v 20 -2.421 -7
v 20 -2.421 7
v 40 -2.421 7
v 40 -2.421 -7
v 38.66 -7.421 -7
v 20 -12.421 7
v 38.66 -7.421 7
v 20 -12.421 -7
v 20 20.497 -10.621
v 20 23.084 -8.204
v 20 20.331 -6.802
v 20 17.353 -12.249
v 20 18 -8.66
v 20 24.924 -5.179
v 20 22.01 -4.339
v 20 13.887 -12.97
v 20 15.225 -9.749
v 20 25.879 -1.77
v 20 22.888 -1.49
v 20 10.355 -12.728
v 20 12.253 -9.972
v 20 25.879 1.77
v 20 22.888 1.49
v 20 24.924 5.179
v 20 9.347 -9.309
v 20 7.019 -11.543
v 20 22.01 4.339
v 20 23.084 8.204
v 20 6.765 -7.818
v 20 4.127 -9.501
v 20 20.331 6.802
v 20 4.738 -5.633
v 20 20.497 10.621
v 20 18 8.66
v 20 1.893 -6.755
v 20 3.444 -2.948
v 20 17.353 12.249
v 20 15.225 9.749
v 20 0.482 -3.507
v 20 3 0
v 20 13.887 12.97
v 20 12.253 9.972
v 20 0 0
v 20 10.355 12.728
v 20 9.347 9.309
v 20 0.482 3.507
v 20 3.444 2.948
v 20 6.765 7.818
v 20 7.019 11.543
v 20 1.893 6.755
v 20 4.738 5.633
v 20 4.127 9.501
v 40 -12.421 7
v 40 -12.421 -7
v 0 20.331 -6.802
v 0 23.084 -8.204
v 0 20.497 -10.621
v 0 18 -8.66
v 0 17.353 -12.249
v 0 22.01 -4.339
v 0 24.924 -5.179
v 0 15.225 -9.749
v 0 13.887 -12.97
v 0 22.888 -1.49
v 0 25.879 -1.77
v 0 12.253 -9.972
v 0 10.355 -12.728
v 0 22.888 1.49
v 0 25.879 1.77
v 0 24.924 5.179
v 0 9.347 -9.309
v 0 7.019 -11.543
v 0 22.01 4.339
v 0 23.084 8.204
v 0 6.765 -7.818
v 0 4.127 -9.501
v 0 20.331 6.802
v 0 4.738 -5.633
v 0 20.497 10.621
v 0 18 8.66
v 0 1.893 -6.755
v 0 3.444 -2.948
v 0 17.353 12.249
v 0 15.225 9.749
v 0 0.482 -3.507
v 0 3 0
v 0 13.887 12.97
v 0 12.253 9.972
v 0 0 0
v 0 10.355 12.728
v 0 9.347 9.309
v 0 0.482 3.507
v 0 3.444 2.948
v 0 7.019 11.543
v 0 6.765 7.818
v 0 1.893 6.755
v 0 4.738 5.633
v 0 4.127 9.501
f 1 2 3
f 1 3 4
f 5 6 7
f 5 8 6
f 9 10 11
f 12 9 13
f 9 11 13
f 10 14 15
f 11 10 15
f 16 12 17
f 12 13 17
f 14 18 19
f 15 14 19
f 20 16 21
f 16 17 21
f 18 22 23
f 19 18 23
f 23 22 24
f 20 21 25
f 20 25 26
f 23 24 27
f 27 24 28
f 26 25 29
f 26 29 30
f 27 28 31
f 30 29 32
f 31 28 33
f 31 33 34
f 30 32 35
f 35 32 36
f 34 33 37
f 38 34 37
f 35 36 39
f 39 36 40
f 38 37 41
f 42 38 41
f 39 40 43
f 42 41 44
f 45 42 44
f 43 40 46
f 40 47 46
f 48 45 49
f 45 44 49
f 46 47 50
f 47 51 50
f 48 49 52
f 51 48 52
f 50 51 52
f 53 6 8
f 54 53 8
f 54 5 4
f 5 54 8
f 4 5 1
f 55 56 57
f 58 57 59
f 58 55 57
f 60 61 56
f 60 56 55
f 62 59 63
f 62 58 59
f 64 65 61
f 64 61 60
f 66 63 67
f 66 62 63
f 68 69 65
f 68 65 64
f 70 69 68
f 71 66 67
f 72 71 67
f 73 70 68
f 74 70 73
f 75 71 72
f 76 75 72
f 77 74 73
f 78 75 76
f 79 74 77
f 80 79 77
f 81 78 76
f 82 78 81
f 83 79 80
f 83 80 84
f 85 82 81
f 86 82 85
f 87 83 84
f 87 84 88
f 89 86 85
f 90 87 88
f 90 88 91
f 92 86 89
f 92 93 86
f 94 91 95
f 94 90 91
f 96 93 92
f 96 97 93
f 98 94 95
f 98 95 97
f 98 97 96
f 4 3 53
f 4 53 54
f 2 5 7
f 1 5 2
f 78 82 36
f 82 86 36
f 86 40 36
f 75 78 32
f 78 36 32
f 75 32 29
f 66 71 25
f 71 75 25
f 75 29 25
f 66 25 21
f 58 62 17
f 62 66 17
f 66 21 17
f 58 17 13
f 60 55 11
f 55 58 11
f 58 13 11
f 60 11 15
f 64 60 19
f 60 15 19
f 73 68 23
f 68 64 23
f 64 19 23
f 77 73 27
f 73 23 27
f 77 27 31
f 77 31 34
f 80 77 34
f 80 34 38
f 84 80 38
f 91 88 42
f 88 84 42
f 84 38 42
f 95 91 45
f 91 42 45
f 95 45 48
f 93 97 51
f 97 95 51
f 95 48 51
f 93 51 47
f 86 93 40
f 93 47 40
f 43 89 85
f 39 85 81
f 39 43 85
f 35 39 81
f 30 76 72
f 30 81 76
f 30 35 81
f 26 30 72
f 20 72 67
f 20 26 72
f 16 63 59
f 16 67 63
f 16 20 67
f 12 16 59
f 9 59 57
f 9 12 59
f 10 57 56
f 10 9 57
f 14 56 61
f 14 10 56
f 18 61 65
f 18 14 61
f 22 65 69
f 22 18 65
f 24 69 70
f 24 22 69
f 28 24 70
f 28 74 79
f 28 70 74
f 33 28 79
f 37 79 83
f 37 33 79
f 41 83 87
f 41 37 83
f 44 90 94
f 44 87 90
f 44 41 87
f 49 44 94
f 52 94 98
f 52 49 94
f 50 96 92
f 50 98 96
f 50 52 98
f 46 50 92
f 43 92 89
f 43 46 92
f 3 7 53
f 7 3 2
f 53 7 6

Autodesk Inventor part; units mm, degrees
ref_plane "YZ Plane" through (0, 0, 0) normal (1, 0, 0) x (0, 1, 0)
ref_plane "XZ Plane" through (0, 0, 0) normal (0, 1, 0) x (-1, 0, 0)
ref_plane "XY Plane" through (0, 0, 0) normal (0, 0, 1) x (1, 0, 0)
sketch "Sketch1" plane through (0, 0, 0) normal (0, 0, 1) x (1, 0, 0)
  line L0 (0, 0) -> (20, 0)
  line L1 (0, 0) -> (0, 3)
  line L2 (0, 3) -> (20, 3)
  line L3 (20, 3) -> (20, 0)
  line L4 (20, 13) -> (0, 13)
  dimension "d1" = 3
  dimension "d2" = 20
  dimension "d3" = 10
  dimension "d4" = 20
  dimension "d5" = 20
revolve "Revolution1" add sketch "Sketch1" angle 360 about axis through (20, 13, 0) along (-1, 0, 0)
sketch "Sketch3" plane through (0, 13, 0) normal (-1, 0, 0) x (0, 0, 1)
  point P0 (0, -13)
sketch "Sketch4" plane through (20, 13, 0) normal (1, 0, 0) x (0, 0, -1)
  circle A0 centre (0, 0) radius 10 projected
  circle A1 centre (0, 0) radius 13 projected
sketch "Sketch5" plane through (20, 13, 0) normal (1, 0, 0) x (0, 0, -1)
  point P0 (0, -13)
sketch "Sketch6" plane through (20, 13, 0) normal (1, 0, 0) x (0, 0, -1)
  circle A0 centre (0, 0) radius 13 projected
  circle A1 centre (0, 0) radius 10 projected
  line L0 (-7, -15.4207) -> (-7, -25.4207)
  line L1 (-7, -25.4207) -> (7, -25.4207)
  line L2 (7, -25.4207) -> (7, -15.4207)
  line L3 (-7, -15.4207) -> (7, -15.4207)
  point P0 (0, -13)
  dimension "d20" = 10
  dimension "d21" = 14
extrude "Extrusion1" add sketch "Sketch6" along normal blind 20 contours L3 L2 L1 L0
sketch "Sketch7" plane through (20, -12.4207, -7) normal (0, 0, -1) x (-1, 0, 0)
  line L0 (0, 10) -> (0, 0) projected
  line L1 (0, 0) -> (-18.6603, 5)
  line L2 (0, 10) -> (-20, 10) projected
  line L3 (-18.6603, 5) -> (0, 10)
  line L4 (0, 0) -> (-20, 0) projected
  point P0 (20, 12.4207)
  dimension "d24" = 15
  dimension "d25" = 15
extrude "Extrusion2" cut sketch "Sketch7" against normal blind 14
sketch "Sketch8" plane through (40, 13, 0) normal (1, 0, 0) x (0, 0, -1)
  point P0 (0, -13)
sketch "Sketch9" plane through (20, 13, 0) normal (1, 0, 0) x (0, 0, -1)
  point P0 (0, -13)
equation "\"d25\" = d24"
properties part number "Whistle Cutout"
